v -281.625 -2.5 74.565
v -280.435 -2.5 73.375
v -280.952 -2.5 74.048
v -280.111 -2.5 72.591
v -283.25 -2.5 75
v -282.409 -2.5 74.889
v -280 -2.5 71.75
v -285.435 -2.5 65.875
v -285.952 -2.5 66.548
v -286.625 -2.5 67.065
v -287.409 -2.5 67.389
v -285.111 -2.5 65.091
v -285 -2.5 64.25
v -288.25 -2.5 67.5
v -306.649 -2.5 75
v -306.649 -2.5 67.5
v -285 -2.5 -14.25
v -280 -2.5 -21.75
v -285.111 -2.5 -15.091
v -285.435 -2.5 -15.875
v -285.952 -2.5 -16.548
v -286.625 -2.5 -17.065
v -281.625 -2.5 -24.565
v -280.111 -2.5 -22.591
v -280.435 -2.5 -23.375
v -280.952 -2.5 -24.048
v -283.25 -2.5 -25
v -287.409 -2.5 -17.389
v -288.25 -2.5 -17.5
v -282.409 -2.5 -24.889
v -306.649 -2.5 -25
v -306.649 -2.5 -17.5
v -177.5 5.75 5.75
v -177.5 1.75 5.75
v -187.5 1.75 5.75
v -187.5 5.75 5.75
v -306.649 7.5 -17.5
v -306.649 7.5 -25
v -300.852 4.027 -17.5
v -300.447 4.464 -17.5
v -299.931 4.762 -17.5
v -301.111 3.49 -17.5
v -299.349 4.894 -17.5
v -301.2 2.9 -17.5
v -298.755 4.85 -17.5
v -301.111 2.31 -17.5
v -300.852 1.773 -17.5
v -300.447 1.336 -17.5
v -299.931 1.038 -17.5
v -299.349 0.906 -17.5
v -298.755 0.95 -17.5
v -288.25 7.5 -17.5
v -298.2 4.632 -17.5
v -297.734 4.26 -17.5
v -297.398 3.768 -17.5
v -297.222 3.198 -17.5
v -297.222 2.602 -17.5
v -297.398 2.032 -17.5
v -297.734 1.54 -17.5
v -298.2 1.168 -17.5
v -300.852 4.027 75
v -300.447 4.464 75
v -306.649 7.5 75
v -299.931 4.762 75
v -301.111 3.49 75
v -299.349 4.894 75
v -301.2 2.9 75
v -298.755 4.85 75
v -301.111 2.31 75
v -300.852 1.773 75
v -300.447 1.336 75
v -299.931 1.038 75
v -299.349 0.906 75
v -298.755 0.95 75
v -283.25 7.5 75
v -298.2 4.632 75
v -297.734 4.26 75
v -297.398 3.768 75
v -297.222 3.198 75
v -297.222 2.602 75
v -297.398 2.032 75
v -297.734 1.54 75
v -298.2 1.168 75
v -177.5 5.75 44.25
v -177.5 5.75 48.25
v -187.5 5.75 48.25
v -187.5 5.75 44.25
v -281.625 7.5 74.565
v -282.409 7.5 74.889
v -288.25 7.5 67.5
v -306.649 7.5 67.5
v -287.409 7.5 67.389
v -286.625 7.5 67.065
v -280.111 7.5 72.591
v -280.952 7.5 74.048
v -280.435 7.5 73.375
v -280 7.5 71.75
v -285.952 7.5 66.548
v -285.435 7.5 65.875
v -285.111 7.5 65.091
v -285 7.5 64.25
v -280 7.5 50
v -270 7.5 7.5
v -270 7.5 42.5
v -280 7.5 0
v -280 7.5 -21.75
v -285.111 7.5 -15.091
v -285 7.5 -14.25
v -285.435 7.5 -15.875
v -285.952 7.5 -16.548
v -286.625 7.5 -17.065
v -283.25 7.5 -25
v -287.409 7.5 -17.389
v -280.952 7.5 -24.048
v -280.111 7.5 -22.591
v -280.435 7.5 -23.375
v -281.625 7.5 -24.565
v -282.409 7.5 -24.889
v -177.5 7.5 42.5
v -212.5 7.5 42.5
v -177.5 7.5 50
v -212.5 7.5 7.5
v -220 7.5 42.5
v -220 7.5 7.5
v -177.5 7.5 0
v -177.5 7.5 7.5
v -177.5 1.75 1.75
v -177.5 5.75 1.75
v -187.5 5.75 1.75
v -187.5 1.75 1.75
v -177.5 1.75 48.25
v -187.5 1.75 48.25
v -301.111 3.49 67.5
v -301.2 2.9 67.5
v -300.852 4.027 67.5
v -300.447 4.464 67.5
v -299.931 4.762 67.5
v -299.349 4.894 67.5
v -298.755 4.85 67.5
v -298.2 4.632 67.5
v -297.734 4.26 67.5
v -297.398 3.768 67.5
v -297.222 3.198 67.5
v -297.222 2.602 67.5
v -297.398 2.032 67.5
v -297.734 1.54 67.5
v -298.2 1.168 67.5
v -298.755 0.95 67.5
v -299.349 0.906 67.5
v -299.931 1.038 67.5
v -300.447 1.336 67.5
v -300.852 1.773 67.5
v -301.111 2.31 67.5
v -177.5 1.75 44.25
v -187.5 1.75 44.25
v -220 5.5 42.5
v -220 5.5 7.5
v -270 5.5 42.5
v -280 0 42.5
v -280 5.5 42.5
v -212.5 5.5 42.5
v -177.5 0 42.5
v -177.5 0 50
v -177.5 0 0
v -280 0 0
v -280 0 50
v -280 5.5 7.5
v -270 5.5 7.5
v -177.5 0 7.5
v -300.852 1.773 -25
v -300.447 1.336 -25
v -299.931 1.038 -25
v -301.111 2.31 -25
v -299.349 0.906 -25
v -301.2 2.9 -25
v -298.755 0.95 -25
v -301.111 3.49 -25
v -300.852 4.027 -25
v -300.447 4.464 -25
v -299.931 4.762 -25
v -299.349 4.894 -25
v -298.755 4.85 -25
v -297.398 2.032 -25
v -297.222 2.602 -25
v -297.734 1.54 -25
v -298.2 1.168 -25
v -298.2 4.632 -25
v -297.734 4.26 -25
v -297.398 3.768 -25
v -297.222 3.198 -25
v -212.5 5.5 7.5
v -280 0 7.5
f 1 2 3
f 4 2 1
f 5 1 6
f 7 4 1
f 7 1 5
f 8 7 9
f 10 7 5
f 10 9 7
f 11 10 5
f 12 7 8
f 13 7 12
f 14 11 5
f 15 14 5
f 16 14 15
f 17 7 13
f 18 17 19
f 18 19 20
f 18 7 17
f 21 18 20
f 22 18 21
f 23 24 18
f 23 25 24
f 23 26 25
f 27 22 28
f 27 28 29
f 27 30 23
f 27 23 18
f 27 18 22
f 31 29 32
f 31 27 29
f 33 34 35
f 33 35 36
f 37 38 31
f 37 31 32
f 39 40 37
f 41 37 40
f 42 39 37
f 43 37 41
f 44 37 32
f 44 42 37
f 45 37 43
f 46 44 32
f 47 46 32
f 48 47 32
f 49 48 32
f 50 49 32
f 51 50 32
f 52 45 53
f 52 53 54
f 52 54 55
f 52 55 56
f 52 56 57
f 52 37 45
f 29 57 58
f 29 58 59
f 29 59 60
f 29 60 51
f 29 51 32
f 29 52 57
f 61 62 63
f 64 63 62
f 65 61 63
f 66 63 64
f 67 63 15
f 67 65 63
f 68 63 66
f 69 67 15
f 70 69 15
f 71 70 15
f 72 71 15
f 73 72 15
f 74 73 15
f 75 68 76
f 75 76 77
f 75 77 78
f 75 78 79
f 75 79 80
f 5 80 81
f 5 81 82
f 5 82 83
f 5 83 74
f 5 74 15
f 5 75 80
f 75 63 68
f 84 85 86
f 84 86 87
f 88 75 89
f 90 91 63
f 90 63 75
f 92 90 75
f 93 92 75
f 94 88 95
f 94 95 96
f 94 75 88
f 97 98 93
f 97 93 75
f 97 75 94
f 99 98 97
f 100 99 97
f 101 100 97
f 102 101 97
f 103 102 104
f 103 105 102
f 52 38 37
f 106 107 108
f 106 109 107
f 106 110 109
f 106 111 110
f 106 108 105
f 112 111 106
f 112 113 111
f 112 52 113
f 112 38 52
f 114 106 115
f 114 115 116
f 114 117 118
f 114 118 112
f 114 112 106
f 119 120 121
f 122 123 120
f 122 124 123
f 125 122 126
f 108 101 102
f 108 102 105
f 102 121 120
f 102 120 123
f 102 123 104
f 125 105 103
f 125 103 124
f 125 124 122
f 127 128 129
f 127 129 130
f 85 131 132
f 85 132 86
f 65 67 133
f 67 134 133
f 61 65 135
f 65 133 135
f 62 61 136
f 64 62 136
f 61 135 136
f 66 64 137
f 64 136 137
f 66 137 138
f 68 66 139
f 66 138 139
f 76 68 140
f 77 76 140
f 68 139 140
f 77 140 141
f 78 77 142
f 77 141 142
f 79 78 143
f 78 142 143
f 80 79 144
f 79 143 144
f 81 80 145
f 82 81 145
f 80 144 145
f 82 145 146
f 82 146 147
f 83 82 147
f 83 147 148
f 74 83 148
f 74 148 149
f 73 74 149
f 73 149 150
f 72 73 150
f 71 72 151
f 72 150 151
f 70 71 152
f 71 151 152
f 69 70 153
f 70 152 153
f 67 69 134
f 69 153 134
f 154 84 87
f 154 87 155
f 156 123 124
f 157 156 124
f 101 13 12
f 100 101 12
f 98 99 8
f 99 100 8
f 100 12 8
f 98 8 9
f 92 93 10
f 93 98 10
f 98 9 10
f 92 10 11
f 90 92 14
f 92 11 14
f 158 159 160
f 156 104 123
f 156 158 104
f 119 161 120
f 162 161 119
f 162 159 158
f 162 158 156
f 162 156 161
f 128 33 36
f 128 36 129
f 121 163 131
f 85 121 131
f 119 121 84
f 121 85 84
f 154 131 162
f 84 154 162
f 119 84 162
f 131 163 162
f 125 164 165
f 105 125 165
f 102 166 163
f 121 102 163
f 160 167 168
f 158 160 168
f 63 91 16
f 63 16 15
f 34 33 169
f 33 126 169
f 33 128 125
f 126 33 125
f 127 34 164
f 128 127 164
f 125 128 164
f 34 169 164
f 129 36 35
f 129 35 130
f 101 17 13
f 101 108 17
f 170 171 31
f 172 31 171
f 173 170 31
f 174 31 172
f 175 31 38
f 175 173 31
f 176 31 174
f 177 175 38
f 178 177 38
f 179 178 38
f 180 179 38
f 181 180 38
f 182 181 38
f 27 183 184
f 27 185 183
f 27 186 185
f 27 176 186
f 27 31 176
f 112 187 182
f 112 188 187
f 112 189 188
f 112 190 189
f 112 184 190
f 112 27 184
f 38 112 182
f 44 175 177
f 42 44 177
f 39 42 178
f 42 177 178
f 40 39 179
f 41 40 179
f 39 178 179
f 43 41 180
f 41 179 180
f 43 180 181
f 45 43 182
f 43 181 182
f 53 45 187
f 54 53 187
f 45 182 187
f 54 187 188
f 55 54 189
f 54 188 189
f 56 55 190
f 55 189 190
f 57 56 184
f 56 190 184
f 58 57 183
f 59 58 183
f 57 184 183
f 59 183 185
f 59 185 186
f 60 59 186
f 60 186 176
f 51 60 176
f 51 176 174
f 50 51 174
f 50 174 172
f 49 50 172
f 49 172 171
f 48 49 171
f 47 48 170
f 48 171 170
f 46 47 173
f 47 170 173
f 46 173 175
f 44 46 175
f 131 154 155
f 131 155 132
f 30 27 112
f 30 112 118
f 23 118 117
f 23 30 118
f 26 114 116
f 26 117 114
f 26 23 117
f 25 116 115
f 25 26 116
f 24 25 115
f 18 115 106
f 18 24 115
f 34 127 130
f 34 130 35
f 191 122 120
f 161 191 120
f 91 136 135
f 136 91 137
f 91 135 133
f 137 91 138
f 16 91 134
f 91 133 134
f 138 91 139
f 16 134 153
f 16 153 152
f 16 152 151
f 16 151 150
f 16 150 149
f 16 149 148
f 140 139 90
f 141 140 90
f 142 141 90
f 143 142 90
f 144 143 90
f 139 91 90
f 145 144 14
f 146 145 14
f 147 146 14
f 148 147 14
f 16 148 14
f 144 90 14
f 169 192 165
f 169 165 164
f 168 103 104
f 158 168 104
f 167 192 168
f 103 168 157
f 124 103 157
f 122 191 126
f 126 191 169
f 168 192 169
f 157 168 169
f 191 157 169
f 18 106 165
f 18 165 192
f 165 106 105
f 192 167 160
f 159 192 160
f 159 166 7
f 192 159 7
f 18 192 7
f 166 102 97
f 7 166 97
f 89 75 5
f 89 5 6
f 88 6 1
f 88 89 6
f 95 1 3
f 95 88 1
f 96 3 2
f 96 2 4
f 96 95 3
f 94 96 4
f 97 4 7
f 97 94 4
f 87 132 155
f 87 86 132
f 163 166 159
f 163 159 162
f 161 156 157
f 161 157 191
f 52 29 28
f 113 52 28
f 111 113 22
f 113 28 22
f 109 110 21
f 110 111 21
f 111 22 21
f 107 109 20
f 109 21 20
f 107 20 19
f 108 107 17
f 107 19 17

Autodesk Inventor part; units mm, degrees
ref_plane "YZ Plane" through (0, 0, 0) normal (1, 0, 0) x (0, 1, 0)
ref_plane "XZ Plane" through (0, 0, 0) normal (0, 1, 0) x (-1, 0, 0)
ref_plane "XY Plane" through (0, 0, 0) normal (0, 0, 1) x (1, 0, 0)
sketch "Sketch1" plane through (0, 0, 0) normal (0, 1, 0) x (-1, 0, 0)
  line L0 (0, 0) -> (50, 0)
  line L1 (50, 0) -> (50, 50)
  line L2 (50, 50) -> (0, 50)
  line L3 (0, 50) -> (0, 0)
  line L4 (50, 50) -> (290, 50)
  line L5 (290, 50) -> (290, 42.5)
  line L6 (290, 42.5) -> (50, 42.5)
  line L7 (50, 42.5) -> (50, 50)
  line L8 (50, 0) -> (290, 0)
  line L9 (290, 0) -> (290, 7.5)
  line L10 (290, 7.5) -> (50, 7.5)
  line L11 (50, 7.5) -> (50, 0)
  dimension "d0" = 50
  dimension "d1" = 50
  dimension "d2" = 240
  dimension "d3" = 7.5
  dimension "d4" = 7.5
extrude "Extrusion1" add sketch "Sketch1" along normal blind 7.5
sketch "Sketch2" plane through (0, 7.5, 0) normal (0, 1, 0) x (1, 0, 0)
  line L0 (0, -50) -> (0, 0) projected
  point P0 (0, -25)
hole "Hole1" at (0, 7.5, 25) direction (0, -1, 0) diameter 6.35 end through all
sketch "Sketch3" plane through (0, 7.5, 0) normal (0, 1, 0) x (1, 0, 0)
  line L0 (-3.175, -50) -> (-3.175, 0) construction
  line L1 (-3.175, -50) -> (-28.175, -50) construction
  line L2 (-28.175, -50) -> (-28.175, 0) construction
  line L3 (-28.175, 0) -> (-3.175, 0) construction
  point P0 (0, 0)
  point P1 (-7.175, -4)
  point P2 (-24.175, -46)
  dimension "d14" = 25
hole "Hole2" at (-7.175, 7.5, 4) at (-24.175, 7.5, 46) direction (0, -1, 0) diameter 3.3 end through all
sketch "Sketch4" plane through (0, 7.5, 0) normal (0, 1, 0) x (1, 0, 0)
  arc A0 (0, -21.825) -> (0, -28.175) centre (0, -25) ccw construction
  line L0 (-3.175, -25) -> (-28.175, -25) construction
  line L1 (-3.175, -25) -> (21.825, -25) construction
  line L2 (-290, -50) -> (0, -50) construction
  line L3 (-28.175, -50) -> (-28.175, 0) construction
  line L4 (-50, -7.5) -> (-50, -42.5) construction
  line L5 (-50, -42.5) -> (-45, -42.5) construction
  line L6 (-45, -42.5) -> (-45, -32.5) construction
  line L7 (-45, -32.5) -> (-50, -32.5) construction
  line L8 (-50, -32.5) -> (-50, -42.5) construction
  line L9 (-45, -32.5) -> (-40, -32.5)
  line L10 (-40, -32.5) -> (-40, -42.5)
  line L11 (-40, -42.5) -> (-45, -42.5)
  line L12 (-45, -42.5) -> (-45, -32.5)
  point P0 (0, 0)
  dimension "d22" = 25
  dimension "d23" = 180
  dimension "d24" = 5
  dimension "d25" = 10
  dimension "d26" = 5
extrude "Extrusion2" add sketch "Sketch4" along normal blind 17.5
sketch "Sketch5" plane through (0, 7.5, 0) normal (0, 1, 0) x (1, 0, 0)
  line L0 (-85, -7.5) -> (-85, -42.5)
  line L1 (-127.5, -7.5) -> (-127.5, -42.5)
  line L2 (-92.5, -42.5) -> (-92.5, -7.5)
  line L3 (-135, -7.5) -> (-170, -7.5) construction
  line L4 (-170, -7.5) -> (-170, -42.5) construction
  line L5 (-170, -42.5) -> (-135, -42.5) construction
  line L6 (-135, -42.5) -> (-135, -7.5) construction
  line L7 (-177.5, -7.5) -> (-212.5, -7.5) construction
  line L8 (-212.5, -7.5) -> (-212.5, -42.5) construction
  line L9 (-212.5, -42.5) -> (-177.5, -42.5) construction
  line L10 (-177.5, -42.5) -> (-177.5, -7.5) construction
  line L11 (-220, -7.5) -> (-255, -7.5) construction
  line L12 (-255, -7.5) -> (-255, -42.5) construction
  line L13 (-255, -42.5) -> (-220, -42.5) construction
  line L14 (-220, -42.5) -> (-220, -7.5) construction
  line L15 (-85, -7.5) -> (-92.5, -7.5) construction
  line L16 (-92.5, -7.5) -> (-92.5, -42.5) construction
  line L17 (-92.5, -42.5) -> (-85, -42.5) construction
  line L18 (-85, -42.5) -> (-85, -7.5) construction
  line L19 (-127.5, -7.5) -> (-135, -7.5) construction
  line L20 (-135, -7.5) -> (-135, -42.5) construction
  line L21 (-135, -42.5) -> (-127.5, -42.5) construction
  line L22 (-127.5, -42.5) -> (-127.5, -7.5) construction
  line L23 (-170, -7.5) -> (-177.5, -7.5) construction
  line L24 (-177.5, -7.5) -> (-177.5, -42.5) construction
  line L25 (-177.5, -42.5) -> (-170, -42.5) construction
  line L26 (-170, -42.5) -> (-170, -7.5) construction
  line L27 (-212.5, -7.5) -> (-220, -7.5) construction
  line L28 (-220, -7.5) -> (-220, -42.5) construction
  line L29 (-220, -42.5) -> (-212.5, -42.5) construction
  line L30 (-212.5, -42.5) -> (-212.5, -7.5) construction
  line L31 (-220, -7.5) -> (-212.5, -7.5)
  line L32 (-212.5, -7.5) -> (-212.5, -42.5)
  line L33 (-212.5, -42.5) -> (-220, -42.5)
  line L34 (-220, -42.5) -> (-220, -7.5)
  line L35 (-177.5, -7.5) -> (-170, -7.5)
  line L36 (-170, -7.5) -> (-170, -42.5)
  line L37 (-170, -42.5) -> (-177.5, -42.5)
  line L38 (-177.5, -42.5) -> (-177.5, -7.5)
  line L39 (-135, -7.5) -> (-127.5, -7.5)
  line L40 (-127.5, -7.5) -> (-127.5, -42.5)
  line L41 (-127.5, -42.5) -> (-135, -42.5)
  line L42 (-135, -42.5) -> (-135, -7.5)
  line L43 (-92.5, -7.5) -> (-85, -7.5)
  line L44 (-85, -7.5) -> (-85, -42.5)
  line L45 (-85, -42.5) -> (-92.5, -42.5)
  line L46 (-92.5, -42.5) -> (-92.5, -7.5)
  point P0 (0, 0)
  point P1 (-50, -7.5)
  dimension "d30" = 35
  dimension "d31" = 35
  dimension "d32" = 35
  dimension "d33" = 35
  dimension "d34" = 35
  dimension "d35" = 35
extrude "Extrusion3" add sketch "Sketch5" against normal blind 2
sketch "Sketch6" plane through (0, 7.5, 0) normal (0, 1, 0) x (1, 0, 0)
  line L0 (-290, 0) -> (-290, -7.5) projected
  line L1 (-290, -50) -> (0, -50) projected
  line L2 (-290, 0) -> (-280, 0)
  line L3 (-280, 0) -> (-280, -50)
  line L4 (-280, -50) -> (-290, -50)
  line L5 (-290, -50) -> (-290, 0)
  point P0 (0, 0)
  dimension "d38" = 10
extrude "Extrusion4" cut sketch "Sketch6" against normal blind 7.5
sketch "Sketch7" plane through (-280, 7.5, 0) normal (-1, 0, 0) x (0, 0, 1)
  point P0 (0, -7.5)
sketch "Sketch8" plane through (-280, 7.5, 0) normal (-1, 0, 0) x (0, 0, 1)
  line L0 (-25, 0) -> (75, 0)
  line L1 (75, 0) -> (75, -7.5)
  line L2 (75, -7.5) -> (-25, -7.5)
  line L3 (-25, -7.5) -> (-25, 0)
  line L4 (-25, 0) -> (75, 0)
  line L5 (75, 0) -> (75, -10)
  line L6 (75, -10) -> (-25, -10)
  line L7 (-25, -10) -> (-25, 0)
  point P0 (0, -7.5)
  dimension "d41" = 100
  dimension "d42" = 10
extrude "Extrusion5" add sketch "Sketch8" along normal blind 7.5
sketch "Sketch9" plane through (-287.5, 7.5, 0) normal (-1, 0, 0) x (0, 0, 1)
  line L0 (75, 0) -> (-25, 0) projected
  line L1 (-25, -10) -> (75, -10) projected
  line L2 (-25, 0) -> (-17.5, 0)
  line L3 (-17.5, 0) -> (-17.5, -10)
  line L4 (-17.5, -10) -> (-25, -10)
  line L5 (-25, -10) -> (-25, 0)
  line L6 (75, 0) -> (67.5, 0)
  line L7 (67.5, 0) -> (67.5, -10)
  line L8 (67.5, -10) -> (75, -10)
  line L9 (75, -10) -> (75, 0)
  point P0 (0, -7.5)
  dimension "d45" = 7.5
  dimension "d46" = 7.5
extrude "Extrusion6" add sketch "Sketch9" along normal blind 25 contours L9 L1 L7 L0 | L3 L1 L5 L0
sketch "Sketch10" plane through (-287.5, -2.5, -17.5) normal (0, 0, 1) x (1, 0, 0)
  line L0 (0, 0) -> (-25, 0) construction
  line L1 (0, 0) -> (-3, 0) construction
  line L2 (-3, 0) -> (-6.2, 0)
  line L3 (-6.2, 0) -> (-6.2, 2.1)
  line L4 (-6.2, 2.1) -> (-3, 2.1)
  line L5 (-3, 2.1) -> (-3, 0)
  line L6 (-6.2, 2.1) -> (-11.7, 2.1) construction
  line L7 (-11.7, 2.1) -> (-11.7, 5.4) construction
  point P0 (287.5, 2.5)
  dimension "d49" = 3
  dimension "d50" = 3.2
  dimension "d51" = 2.1
  dimension "d52" = 5.5
  dimension "d53" = 3.3
extrude "Extrusion7" add sketch "Sketch10" along normal blind 92.5
sketch "Sketch11" plane through (-287.5, -2.5, -17.5) normal (0, 0, 1) x (1, 0, 0)
  line L0 (-6.2, 2.1) -> (-3, 2.1) construction
  line L1 (-6.2, 2.1) -> (-11.7, 2.1) construction
  line L2 (-11.7, 2.1) -> (-11.7, 5.4) construction
  circle A0 centre (-11.7, 5.4) radius 2.125
  point P0 (287.5, 2.5)
  dimension "d56" = 5.5
  dimension "d57" = 3.3
  dimension "d58" = 4.25
extrude "Extrusion8" cut sketch "Sketch11" along normal mid plane 241
sketch "Sketch12" plane through (-287.5, -2.5, -17.5) normal (0, 0, 1) x (1, 0, 0)
  circle A0 centre (-11.7, 5.4) radius 2.125 construction
  line L0 (-11.7, 5.4) -> (-11.7, 0.96) construction
  line L1 (-11.7, 0.96) -> (-16.7, 0.96) construction
  line L2 (-6.2, 0) -> (-25, 0) projected
  line L3 (-16.7, 0.96) -> (-19.2, 0.96)
  line L4 (-19.2, 0.96) -> (-19.2, 0)
  line L5 (-19.2, 0) -> (-16.7, 0)
  line L6 (-16.7, 0) -> (-16.7, 0.96)
  point P0 (287.5, 2.5)
  dimension "d61" = 4.44
  dimension "d62" = 5
  dimension "d63" = 2.5
extrude "Extrusion9" add sketch "Sketch12" along normal blind 91.25
sketch "Sketch13" plane through (-293.7, -0.4, -17.5) normal (0, 1, 0) x (1, 0, 0)
  line L0 (3.2, 0) -> (3.2, -85) construction
  line L1 (3.2, 0) -> (3.2, -30) construction
  line L2 (0, 0) -> (0, -85) construction
  line L3 (3.2, -30) -> (0, -30) construction
  line L4 (0, -30) -> (0, -36.35) construction
  line L5 (0, -36.35) -> (3.2, -36.35) construction
  line L6 (3.2, -36.35) -> (3.2, -30) construction
  line L7 (0, -30) -> (3.2, -30)
  line L8 (3.2, -30) -> (3.2, -36.35)
  line L9 (3.2, -36.35) -> (0, -36.35)
  line L10 (0, -36.35) -> (0, -30)
  point P0 (293.7, -17.5)
  dimension "d66" = 30
  dimension "d67" = 6.35
extrude "Extrusion10" add sketch "Sketch13" along normal blind 3.8
sketch "Sketch14" plane through (0, 7.5, 0) normal (0, 1, 0) x (1, 0, 0)
  line L0 (-287.5, 17.5) -> (-287.5, -67.5) projected
  line L1 (-287.5, 17.5) -> (-285, 17.5)
  line L2 (-285, 17.5) -> (-285, -67.5)
  line L3 (-285, -67.5) -> (-287.5, -67.5)
  line L4 (-287.5, -67.5) -> (-287.5, 17.5)
  point P0 (0, 0)
  dimension "d70" = 2.5
extrude "Extrusion11" cut sketch "Sketch14" against normal blind 14.55
sketch "Sketch15" plane through (0, 7.5, 0) normal (0, 1, 0) x (1, 0, 0)
  line L0 (-312.5, 17.5) -> (-312.5, 25) projected
  line L1 (-280, -75) -> (-312.5, -75) projected
  line L2 (-312.5, 25) -> (-306.6488, 25)
  line L3 (-306.6488, 25) -> (-306.6488, -75)
  line L4 (-306.6488, -75) -> (-312.5, -75)
  line L5 (-312.5, -75) -> (-312.5, 25)
  point P0 (0, 0)
extrude "Extrusion12" cut sketch "Sketch15" against normal blind 14.55
fillet "Fillet1" radius 0.1 1 edges at (-301.325, 2.9, -17.5)
fillet "Fillet2" radius 0.1 1 edges at (-301.325, 2.9, 67.5)
fillet "Fillet3" radius 3.25 1 edges at (-280, 2.5, 75)
fillet "Fillet4" radius 3.25 1 edges at (-285, 2.5, 67.5)
fillet "Fillet5" radius 3.25 1 edges at (-280, 2.5, -25)
fillet "Fillet6" radius 3.25 1 edges at (-285, 2.5, -17.5)
sketch "Sketch16" plane through (0, 7.5, 0) normal (0, 1, 0) x (1, 0, 0)
  line L0 (-220, -42.5) -> (-220, -7.5) construction
  line L1 (-220, -42.5) -> (-280, -42.5) construction
  line L2 (-220, -7.5) -> (-255, -7.5) construction
  line L3 (-255, -7.5) -> (-255, -42.5) construction
  line L4 (-255, -42.5) -> (-220, -42.5) construction
  line L5 (-220, -42.5) -> (-220, -7.5) construction
  line L6 (-280, -7.5) -> (-280, 0) projected
  line L7 (-280, -7.5) -> (-270, -7.5)
  line L8 (-270, -7.5) -> (-270, -42.5)
  line L9 (-270, -42.5) -> (-280, -42.5)
  line L10 (-280, -42.5) -> (-280, -7.5)
  point P0 (0, 0)
  dimension "d81" = 35
  dimension "d82" = 10
extrude "Extrusion13" add sketch "Sketch16" against normal blind 2
sketch "Sketch17" plane through (0, 7.5, 0) normal (0, 1, 0) x (1, 0, 0)
  point P0 (0, 0)
sketch "Sketch18" plane through (0, 7.5, 0) normal (0, 1, 0) x (1, 0, 0)
  line L0 (-270, -7.5) -> (-270, -42.5) construction
  line L1 (-285, -64.25) -> (-285, 14.25) construction
  line L2 (-280, -7.5) -> (-280, 0) construction
  line L3 (-270, -7.5) -> (-280, -7.5) construction
  line L4 (-275, -7.5) -> (-275, -42.5) construction
  line L5 (-50, -42.5) -> (-280, -42.5) construction
  circle A0 centre (-275, -12.5) radius 1.8 construction
  circle A1 centre (-275, -37.5) radius 1.8 construction
  circle A2 centre (-275, -12.5) radius 1.8
  circle A3 centre (-275, -37.5) radius 1.8
  point P0 (0, 0)
  dimension "d85" = 3.6
  dimension "d86" = 3.6
hole "Hole3" at (-275, 7.5, 12.5) at (-275, 7.5, 37.5) direction (0, -1, 0) diameter 3.3 depth 15 tip angle 118
sketch "Sketch19" plane through (0, 7.5, 0) normal (0, 1, 0) x (1, 0, 0)
  circle A0 centre (-275, -12.5) radius 1.65 construction
  line L0 (-275, -12.5) -> (-212.5, -12.5) construction
  line L1 (-212.5, -7.5) -> (-212.5, -42.5) construction
  circle A1 centre (-275, -37.5) radius 1.65 construction
  line L2 (-275, -37.5) -> (-212.5, -37.5) construction
  line L3 (-220, -42.5) -> (-220, -7.5) construction
  line L4 (-220, -12.5) -> (-212.5, -12.5) construction
  line L5 (-216.25, -12.5) -> (-216.25, -37.5) construction
  point P0 (0, 0)
hole "Hole4" at (-216.25, 7.5, 12.5) at (-216.25, 7.5, 37.5) direction (0, -1, 0) diameter 3.3 depth 15 tip angle 118
sketch "Sketch20" plane through (-45, 7.5, 32.5) normal (-1, 0, 0) x (0, 0, 1)
  line L0 (10, 17.5) -> (0, 17.5) construction
  line L1 (5, 17.5) -> (5, -0.1335) construction
  line L2 (10, 0) -> (10, 17.5) construction
  line L3 (10, 12.5) -> (5, 12.5) construction
  circle A0 centre (5, 12.5) radius 3
  point P0 (-32.5, -7.5)
  dimension "d101" = 6
extrude "Extrusion14" cut sketch "Sketch20" against normal blind 20
sketch "Sketch21" plane through (0, 7.5, 0) normal (0, 1, 0) x (1, 0, 0)
  line L0 (-306.6488, 17.5) -> (-306.6488, -67.5) projected
  line L1 (-306.6488, 17.5) -> (-288.25, 17.5) projected
  line L2 (-306.6488, -67.5) -> (-288.25, -67.5)
  line L3 (-288.25, -67.5) -> (-288.25, 17.5)
  line L4 (-288.25, 17.5) -> (-306.6488, 17.5)
  line L5 (-306.6488, 17.5) -> (-306.6488, -67.5)
  point P0 (0, 0)
extrude "Extrusion15" cut sketch "Sketch21" against normal blind 10
sketch "Sketch22" plane through (0, 7.5, 0) normal (0, 1, 0) x (1, 0, 0)
  line L0 (-280, -50) -> (0, -50) projected
  line L1 (0, 0) -> (-280, 0) projected
  line L2 (-280, -50) -> (-270.5687, -50)
  line L3 (-270.5687, -50) -> (-270.5687, 0)
  line L4 (-270.5687, 0) -> (-280, 0)
  line L5 (-280, 0) -> (-280, -50)
  line L6 (-50, -42.5) -> (-280, -42.5) projected
  line L7 (-219.3019, -42.5) -> (-213.3073, -42.5)
  line L8 (-213.3073, -42.5) -> (-213.3073, -8.284)
  line L9 (-213.3073, -8.284) -> (-219.3019, -8.284)
  line L10 (-219.3019, -8.284) -> (-219.3019, -42.5)
extrude "Extrusion16" add sketch "Sketch22" against normal blind 2
sketch "Sketch23" plane through (-306.6488, -2.5, -25) normal (0, 0, -1) x (-1, 0, 0)
  circle A0 centre (-7.4488, 5.4) radius 2.125 projected
  circle A1 centre (-7.4488, 5.4) radius 2
  circle A2 centre (-7.4488, 5.4) radius 2.4429
  point P0 (-306.6488, 2.5)
  dimension "d108" = 4
extrude "Extrusion17" add sketch "Sketch23" against normal blind 100 contours A0 | A2
sketch "Sketch24" plane through (0, 7.5, 0) normal (0, 1, 0) x (1, 0, 0)
  line L0 (-288.25, -67.5) -> (-306.6488, -67.5) projected
  arc A0 (-285, 14.25) -> (-288.25, 17.5) centre (-288.25, 14.25) ccw projected
  line L1 (-306.6488, -67.5) -> (-288.25, -67.5)
  line L2 (-288.25, -67.5) -> (-288.25, 17.5)
  line L3 (-288.25, 17.5) -> (-306.6488, 17.5)
  line L4 (-306.6488, 17.5) -> (-306.6488, -67.5)
  point P0 (0, 0)
extrude "Extrusion18" cut sketch "Sketch24" against normal blind 100
sketch "Sketch25" plane through (0, 7.5, 0) normal (0, 1, 0) x (1, 0, 0)
  line L0 (-50, -42.5) -> (-280, -42.5) projected
  line L1 (-280, -7.5) -> (-50, -7.5) projected
  line L2 (-50, -42.5) -> (-55, -42.5)
  line L3 (-55, -42.5) -> (-55, -7.5)
  line L4 (-55, -7.5) -> (-50, -7.5)
  line L5 (-50, -7.5) -> (-50, -42.5)
  point P0 (0, 0)
  dimension "d113" = 5
extrude "Extrusion19" add sketch "Sketch25" against normal blind 2
sketch "Sketch26" plane through (0, 7.5, 0) normal (0, 1, 0) x (1, 0, 0)
  line L0 (-55, -42.5) -> (-85, -42.5) construction
  line L1 (-55, -42.5) -> (-50, -42.5) construction
  line L2 (-55, -42.5) -> (-50, -42.5) construction
  line L3 (-50, -42.5) -> (-50, -7.5) construction
  line L4 (-50, -42.5) -> (-50, -7.5) construction
  circle A0 centre (-50, -37.5) radius 1.65 construction
  circle A1 centre (-50, -12.5) radius 1.65 construction
  circle A2 centre (-50, -37.5) radius 1.65
  circle A3 centre (-50, -12.5) radius 1.65
  line L5 (-50, -37.5) -> (-92.5, -37.5) construction
  line L6 (-92.5, -42.5) -> (-92.5, -7.5) construction
  line L7 (-50, -12.5) -> (-92.5, -12.5) construction
  line L8 (-92.5, -37.5) -> (-85, -37.5) construction
  line L9 (-85, -7.5) -> (-85, -42.5) construction
  line L10 (-88.75, -37.5) -> (-88.75, -12.5) construction
  circle A4 centre (-88.75, -37.5) radius 1.65
  circle A5 centre (-88.75, -12.5) radius 1.65
  point P0 (0, 0)
  dimension "d116" = 3.3
  dimension "d117" = 3.3
  dimension "d118" = 3.3
  dimension "d119" = 3.3
extrude "Extrusion20" cut sketch "Sketch26" against normal blind 2
sketch "Sketch27" plane through (0, 5.5, 0) normal (0, -1, 0) x (1, 0, 0)
  line L0 (-50, 7.5) -> (-55, 7.5) projected
  line L1 (-55, 7.5) -> (-46.6169, 7.5)
  line L2 (-46.6169, 7.5) -> (-46.6169, 42.5)
  line L3 (-46.6169, 42.5) -> (-55, 42.5)
  line L4 (-55, 42.5) -> (-55, 7.5)
  point P0 (0, 0)
extrude "Extrusion21" add sketch "Sketch27" along normal blind 5.5
sketch "Sketch28" plane through (0, 7.5, 0) normal (0, 1, 0) x (1, 0, 0)
  circle A0 centre (-50, -12.5) radius 1.65 projected
  circle A1 centre (-50, -37.5) radius 1.65 projected
  point P0 (0, 0)
hole "Hole5" at (-50, 7.5, 12.5) at (-50, 7.5, 37.5) direction (0, -1, 0) diameter 3.3 depth 8 tip angle 118
sketch "Sketch29" plane through (0, 7.5, 0) normal (0, 1, 0) x (1, 0, 0)
  circle A0 centre (-7.175, -4) radius 1.65 construction
  circle A1 centre (-24.175, -46) radius 1.65 construction
  line L0 (-7.175, -4) -> (-24.175, -46) construction
  line L1 (-7.175, -4) -> (-7.175, -46) construction
  line L2 (-7.175, -46) -> (-24.175, -46) construction
  line L3 (-7.175, -25) -> (-25.825, -25) construction
  line L4 (-25.825, -25) -> (-25.825, -46) construction
  line L5 (-16.5, -25) -> (-25.825, -25) construction
  line L6 (-24.175, -46) -> (-24.175, -25) construction
  line L7 (-15.675, -46) -> (-15.675, -4) construction
  line L8 (-40, -32.5) -> (-40, -42.5) construction
  line L9 (-40, -42.5) -> (-24.175, -42.5) construction
  line L10 (-24.175, -42.5) -> (-24.175, -46) construction
  line L11 (-15.675, -25) -> (-15.675, -46) construction
  line L12 (-15.675, -46) -> (-15.675, -4) construction
  circle A2 centre (-15.675, -46) radius 1.65 construction
  circle A3 centre (-15.675, -46) radius 1.65
  circle A4 centre (-15.675, -4) radius 1.65
  point P0 (0, 0)
  dimension "d131" = 42
  dimension "d132" = 17
  dimension "d133" = 21
  dimension "d135" = 8.5
  dimension "d136" = 15.825
  dimension "d137" = 3.5
  dimension "d138" = 21
  dimension "d139" = 3.3
  dimension "d140" = 3.3
  dimension "d141" = 3.3
extrude "Extrusion22" cut sketch "Sketch29" against normal blind 10
sketch "Sketch30" plane through (0, 7.5, 0) normal (0, 1, 0) x (1, 0, 0)
  circle A0 centre (-7.175, -4) radius 1.65 projected
  circle A1 centre (-7.175, -4) radius 2.1021
  circle A2 centre (-24.175, -46) radius 1.65 projected
  circle A3 centre (-24.175, -46) radius 2.9173
  point P0 (0, 0)
extrude "Extrusion23" add sketch "Sketch30" against normal blind 7.5 contours A0 | A1 | A2 | A3
sketch "Sketch31" plane through (0, 7.5, 0) normal (0, 1, 0) x (1, 0, 0)
  line L0 (-177.5, -42.5) -> (-177.5, -7.5) construction
  line L1 (-177.5, -42.5) -> (-177.5, 0) construction
  line L2 (-280, -50) -> (0, -50) projected
  line L3 (-177.5, 0) -> (0, 0)
  line L4 (0, 0) -> (0, -50)
  line L5 (0, -50) -> (-177.5, -50)
  line L6 (-177.5, -50) -> (-177.5, 0)
extrude "Extrusion24" cut sketch "Sketch31" along normal mid plane 100
sketch "Sketch32" plane through (-177.5, 7.5, 50) normal (1, 0, 0) x (0, 0, -1)
  line L0 (0, 0) -> (7.5, 0) construction
  line L1 (7.5, -7.5) -> (0, -7.5) construction
  line L2 (0, 0) -> (7.5, -7.5) construction
  line L3 (7.5, -7.5) -> (7.5, 0) construction
  line L4 (7.5, 0) -> (0, -7.5) construction
  line L5 (5.75, -5.75) -> (1.75, -5.75)
  line L6 (1.75, -5.75) -> (1.75, -1.75)
  line L7 (1.75, -1.75) -> (5.75, -1.75)
  line L8 (5.75, -1.75) -> (5.75, -5.75)
  line L9 (5.75, -5.75) -> (1.75, -1.75) construction
  line L10 (1.75, -5.75) -> (5.75, -1.75) construction
  line L11 (42.5, 0) -> (50, 0) construction
  line L12 (42.5, 0) -> (50, -7.5) construction
  line L13 (50, 0) -> (71.75, 0) construction
  line L14 (50, -7.5) -> (50, 0) construction
  line L15 (42.5, -2) -> (42.5, -7.5) construction
  line L16 (50, 0) -> (42.5, -7.5) construction
  line L17 (48.25, -5.75) -> (44.25, -5.75)
  line L18 (44.25, -5.75) -> (44.25, -1.75)
  line L19 (44.25, -1.75) -> (48.25, -1.75)
  line L20 (48.25, -1.75) -> (48.25, -5.75)
  line L21 (48.25, -5.75) -> (44.25, -1.75) construction
  line L22 (44.25, -5.75) -> (48.25, -1.75) construction
  point P0 (3.75, -3.75)
  point P1 (46.25, -3.75)
  dimension "d148" = 4
  dimension "d149" = 4
  dimension "d150" = 4
  dimension "d151" = 4
extrude "Extrusion25" cut sketch "Sketch32" against normal blind 10
properties part number "mtv_frame(BrakeInFront)1-13 - BACK"
